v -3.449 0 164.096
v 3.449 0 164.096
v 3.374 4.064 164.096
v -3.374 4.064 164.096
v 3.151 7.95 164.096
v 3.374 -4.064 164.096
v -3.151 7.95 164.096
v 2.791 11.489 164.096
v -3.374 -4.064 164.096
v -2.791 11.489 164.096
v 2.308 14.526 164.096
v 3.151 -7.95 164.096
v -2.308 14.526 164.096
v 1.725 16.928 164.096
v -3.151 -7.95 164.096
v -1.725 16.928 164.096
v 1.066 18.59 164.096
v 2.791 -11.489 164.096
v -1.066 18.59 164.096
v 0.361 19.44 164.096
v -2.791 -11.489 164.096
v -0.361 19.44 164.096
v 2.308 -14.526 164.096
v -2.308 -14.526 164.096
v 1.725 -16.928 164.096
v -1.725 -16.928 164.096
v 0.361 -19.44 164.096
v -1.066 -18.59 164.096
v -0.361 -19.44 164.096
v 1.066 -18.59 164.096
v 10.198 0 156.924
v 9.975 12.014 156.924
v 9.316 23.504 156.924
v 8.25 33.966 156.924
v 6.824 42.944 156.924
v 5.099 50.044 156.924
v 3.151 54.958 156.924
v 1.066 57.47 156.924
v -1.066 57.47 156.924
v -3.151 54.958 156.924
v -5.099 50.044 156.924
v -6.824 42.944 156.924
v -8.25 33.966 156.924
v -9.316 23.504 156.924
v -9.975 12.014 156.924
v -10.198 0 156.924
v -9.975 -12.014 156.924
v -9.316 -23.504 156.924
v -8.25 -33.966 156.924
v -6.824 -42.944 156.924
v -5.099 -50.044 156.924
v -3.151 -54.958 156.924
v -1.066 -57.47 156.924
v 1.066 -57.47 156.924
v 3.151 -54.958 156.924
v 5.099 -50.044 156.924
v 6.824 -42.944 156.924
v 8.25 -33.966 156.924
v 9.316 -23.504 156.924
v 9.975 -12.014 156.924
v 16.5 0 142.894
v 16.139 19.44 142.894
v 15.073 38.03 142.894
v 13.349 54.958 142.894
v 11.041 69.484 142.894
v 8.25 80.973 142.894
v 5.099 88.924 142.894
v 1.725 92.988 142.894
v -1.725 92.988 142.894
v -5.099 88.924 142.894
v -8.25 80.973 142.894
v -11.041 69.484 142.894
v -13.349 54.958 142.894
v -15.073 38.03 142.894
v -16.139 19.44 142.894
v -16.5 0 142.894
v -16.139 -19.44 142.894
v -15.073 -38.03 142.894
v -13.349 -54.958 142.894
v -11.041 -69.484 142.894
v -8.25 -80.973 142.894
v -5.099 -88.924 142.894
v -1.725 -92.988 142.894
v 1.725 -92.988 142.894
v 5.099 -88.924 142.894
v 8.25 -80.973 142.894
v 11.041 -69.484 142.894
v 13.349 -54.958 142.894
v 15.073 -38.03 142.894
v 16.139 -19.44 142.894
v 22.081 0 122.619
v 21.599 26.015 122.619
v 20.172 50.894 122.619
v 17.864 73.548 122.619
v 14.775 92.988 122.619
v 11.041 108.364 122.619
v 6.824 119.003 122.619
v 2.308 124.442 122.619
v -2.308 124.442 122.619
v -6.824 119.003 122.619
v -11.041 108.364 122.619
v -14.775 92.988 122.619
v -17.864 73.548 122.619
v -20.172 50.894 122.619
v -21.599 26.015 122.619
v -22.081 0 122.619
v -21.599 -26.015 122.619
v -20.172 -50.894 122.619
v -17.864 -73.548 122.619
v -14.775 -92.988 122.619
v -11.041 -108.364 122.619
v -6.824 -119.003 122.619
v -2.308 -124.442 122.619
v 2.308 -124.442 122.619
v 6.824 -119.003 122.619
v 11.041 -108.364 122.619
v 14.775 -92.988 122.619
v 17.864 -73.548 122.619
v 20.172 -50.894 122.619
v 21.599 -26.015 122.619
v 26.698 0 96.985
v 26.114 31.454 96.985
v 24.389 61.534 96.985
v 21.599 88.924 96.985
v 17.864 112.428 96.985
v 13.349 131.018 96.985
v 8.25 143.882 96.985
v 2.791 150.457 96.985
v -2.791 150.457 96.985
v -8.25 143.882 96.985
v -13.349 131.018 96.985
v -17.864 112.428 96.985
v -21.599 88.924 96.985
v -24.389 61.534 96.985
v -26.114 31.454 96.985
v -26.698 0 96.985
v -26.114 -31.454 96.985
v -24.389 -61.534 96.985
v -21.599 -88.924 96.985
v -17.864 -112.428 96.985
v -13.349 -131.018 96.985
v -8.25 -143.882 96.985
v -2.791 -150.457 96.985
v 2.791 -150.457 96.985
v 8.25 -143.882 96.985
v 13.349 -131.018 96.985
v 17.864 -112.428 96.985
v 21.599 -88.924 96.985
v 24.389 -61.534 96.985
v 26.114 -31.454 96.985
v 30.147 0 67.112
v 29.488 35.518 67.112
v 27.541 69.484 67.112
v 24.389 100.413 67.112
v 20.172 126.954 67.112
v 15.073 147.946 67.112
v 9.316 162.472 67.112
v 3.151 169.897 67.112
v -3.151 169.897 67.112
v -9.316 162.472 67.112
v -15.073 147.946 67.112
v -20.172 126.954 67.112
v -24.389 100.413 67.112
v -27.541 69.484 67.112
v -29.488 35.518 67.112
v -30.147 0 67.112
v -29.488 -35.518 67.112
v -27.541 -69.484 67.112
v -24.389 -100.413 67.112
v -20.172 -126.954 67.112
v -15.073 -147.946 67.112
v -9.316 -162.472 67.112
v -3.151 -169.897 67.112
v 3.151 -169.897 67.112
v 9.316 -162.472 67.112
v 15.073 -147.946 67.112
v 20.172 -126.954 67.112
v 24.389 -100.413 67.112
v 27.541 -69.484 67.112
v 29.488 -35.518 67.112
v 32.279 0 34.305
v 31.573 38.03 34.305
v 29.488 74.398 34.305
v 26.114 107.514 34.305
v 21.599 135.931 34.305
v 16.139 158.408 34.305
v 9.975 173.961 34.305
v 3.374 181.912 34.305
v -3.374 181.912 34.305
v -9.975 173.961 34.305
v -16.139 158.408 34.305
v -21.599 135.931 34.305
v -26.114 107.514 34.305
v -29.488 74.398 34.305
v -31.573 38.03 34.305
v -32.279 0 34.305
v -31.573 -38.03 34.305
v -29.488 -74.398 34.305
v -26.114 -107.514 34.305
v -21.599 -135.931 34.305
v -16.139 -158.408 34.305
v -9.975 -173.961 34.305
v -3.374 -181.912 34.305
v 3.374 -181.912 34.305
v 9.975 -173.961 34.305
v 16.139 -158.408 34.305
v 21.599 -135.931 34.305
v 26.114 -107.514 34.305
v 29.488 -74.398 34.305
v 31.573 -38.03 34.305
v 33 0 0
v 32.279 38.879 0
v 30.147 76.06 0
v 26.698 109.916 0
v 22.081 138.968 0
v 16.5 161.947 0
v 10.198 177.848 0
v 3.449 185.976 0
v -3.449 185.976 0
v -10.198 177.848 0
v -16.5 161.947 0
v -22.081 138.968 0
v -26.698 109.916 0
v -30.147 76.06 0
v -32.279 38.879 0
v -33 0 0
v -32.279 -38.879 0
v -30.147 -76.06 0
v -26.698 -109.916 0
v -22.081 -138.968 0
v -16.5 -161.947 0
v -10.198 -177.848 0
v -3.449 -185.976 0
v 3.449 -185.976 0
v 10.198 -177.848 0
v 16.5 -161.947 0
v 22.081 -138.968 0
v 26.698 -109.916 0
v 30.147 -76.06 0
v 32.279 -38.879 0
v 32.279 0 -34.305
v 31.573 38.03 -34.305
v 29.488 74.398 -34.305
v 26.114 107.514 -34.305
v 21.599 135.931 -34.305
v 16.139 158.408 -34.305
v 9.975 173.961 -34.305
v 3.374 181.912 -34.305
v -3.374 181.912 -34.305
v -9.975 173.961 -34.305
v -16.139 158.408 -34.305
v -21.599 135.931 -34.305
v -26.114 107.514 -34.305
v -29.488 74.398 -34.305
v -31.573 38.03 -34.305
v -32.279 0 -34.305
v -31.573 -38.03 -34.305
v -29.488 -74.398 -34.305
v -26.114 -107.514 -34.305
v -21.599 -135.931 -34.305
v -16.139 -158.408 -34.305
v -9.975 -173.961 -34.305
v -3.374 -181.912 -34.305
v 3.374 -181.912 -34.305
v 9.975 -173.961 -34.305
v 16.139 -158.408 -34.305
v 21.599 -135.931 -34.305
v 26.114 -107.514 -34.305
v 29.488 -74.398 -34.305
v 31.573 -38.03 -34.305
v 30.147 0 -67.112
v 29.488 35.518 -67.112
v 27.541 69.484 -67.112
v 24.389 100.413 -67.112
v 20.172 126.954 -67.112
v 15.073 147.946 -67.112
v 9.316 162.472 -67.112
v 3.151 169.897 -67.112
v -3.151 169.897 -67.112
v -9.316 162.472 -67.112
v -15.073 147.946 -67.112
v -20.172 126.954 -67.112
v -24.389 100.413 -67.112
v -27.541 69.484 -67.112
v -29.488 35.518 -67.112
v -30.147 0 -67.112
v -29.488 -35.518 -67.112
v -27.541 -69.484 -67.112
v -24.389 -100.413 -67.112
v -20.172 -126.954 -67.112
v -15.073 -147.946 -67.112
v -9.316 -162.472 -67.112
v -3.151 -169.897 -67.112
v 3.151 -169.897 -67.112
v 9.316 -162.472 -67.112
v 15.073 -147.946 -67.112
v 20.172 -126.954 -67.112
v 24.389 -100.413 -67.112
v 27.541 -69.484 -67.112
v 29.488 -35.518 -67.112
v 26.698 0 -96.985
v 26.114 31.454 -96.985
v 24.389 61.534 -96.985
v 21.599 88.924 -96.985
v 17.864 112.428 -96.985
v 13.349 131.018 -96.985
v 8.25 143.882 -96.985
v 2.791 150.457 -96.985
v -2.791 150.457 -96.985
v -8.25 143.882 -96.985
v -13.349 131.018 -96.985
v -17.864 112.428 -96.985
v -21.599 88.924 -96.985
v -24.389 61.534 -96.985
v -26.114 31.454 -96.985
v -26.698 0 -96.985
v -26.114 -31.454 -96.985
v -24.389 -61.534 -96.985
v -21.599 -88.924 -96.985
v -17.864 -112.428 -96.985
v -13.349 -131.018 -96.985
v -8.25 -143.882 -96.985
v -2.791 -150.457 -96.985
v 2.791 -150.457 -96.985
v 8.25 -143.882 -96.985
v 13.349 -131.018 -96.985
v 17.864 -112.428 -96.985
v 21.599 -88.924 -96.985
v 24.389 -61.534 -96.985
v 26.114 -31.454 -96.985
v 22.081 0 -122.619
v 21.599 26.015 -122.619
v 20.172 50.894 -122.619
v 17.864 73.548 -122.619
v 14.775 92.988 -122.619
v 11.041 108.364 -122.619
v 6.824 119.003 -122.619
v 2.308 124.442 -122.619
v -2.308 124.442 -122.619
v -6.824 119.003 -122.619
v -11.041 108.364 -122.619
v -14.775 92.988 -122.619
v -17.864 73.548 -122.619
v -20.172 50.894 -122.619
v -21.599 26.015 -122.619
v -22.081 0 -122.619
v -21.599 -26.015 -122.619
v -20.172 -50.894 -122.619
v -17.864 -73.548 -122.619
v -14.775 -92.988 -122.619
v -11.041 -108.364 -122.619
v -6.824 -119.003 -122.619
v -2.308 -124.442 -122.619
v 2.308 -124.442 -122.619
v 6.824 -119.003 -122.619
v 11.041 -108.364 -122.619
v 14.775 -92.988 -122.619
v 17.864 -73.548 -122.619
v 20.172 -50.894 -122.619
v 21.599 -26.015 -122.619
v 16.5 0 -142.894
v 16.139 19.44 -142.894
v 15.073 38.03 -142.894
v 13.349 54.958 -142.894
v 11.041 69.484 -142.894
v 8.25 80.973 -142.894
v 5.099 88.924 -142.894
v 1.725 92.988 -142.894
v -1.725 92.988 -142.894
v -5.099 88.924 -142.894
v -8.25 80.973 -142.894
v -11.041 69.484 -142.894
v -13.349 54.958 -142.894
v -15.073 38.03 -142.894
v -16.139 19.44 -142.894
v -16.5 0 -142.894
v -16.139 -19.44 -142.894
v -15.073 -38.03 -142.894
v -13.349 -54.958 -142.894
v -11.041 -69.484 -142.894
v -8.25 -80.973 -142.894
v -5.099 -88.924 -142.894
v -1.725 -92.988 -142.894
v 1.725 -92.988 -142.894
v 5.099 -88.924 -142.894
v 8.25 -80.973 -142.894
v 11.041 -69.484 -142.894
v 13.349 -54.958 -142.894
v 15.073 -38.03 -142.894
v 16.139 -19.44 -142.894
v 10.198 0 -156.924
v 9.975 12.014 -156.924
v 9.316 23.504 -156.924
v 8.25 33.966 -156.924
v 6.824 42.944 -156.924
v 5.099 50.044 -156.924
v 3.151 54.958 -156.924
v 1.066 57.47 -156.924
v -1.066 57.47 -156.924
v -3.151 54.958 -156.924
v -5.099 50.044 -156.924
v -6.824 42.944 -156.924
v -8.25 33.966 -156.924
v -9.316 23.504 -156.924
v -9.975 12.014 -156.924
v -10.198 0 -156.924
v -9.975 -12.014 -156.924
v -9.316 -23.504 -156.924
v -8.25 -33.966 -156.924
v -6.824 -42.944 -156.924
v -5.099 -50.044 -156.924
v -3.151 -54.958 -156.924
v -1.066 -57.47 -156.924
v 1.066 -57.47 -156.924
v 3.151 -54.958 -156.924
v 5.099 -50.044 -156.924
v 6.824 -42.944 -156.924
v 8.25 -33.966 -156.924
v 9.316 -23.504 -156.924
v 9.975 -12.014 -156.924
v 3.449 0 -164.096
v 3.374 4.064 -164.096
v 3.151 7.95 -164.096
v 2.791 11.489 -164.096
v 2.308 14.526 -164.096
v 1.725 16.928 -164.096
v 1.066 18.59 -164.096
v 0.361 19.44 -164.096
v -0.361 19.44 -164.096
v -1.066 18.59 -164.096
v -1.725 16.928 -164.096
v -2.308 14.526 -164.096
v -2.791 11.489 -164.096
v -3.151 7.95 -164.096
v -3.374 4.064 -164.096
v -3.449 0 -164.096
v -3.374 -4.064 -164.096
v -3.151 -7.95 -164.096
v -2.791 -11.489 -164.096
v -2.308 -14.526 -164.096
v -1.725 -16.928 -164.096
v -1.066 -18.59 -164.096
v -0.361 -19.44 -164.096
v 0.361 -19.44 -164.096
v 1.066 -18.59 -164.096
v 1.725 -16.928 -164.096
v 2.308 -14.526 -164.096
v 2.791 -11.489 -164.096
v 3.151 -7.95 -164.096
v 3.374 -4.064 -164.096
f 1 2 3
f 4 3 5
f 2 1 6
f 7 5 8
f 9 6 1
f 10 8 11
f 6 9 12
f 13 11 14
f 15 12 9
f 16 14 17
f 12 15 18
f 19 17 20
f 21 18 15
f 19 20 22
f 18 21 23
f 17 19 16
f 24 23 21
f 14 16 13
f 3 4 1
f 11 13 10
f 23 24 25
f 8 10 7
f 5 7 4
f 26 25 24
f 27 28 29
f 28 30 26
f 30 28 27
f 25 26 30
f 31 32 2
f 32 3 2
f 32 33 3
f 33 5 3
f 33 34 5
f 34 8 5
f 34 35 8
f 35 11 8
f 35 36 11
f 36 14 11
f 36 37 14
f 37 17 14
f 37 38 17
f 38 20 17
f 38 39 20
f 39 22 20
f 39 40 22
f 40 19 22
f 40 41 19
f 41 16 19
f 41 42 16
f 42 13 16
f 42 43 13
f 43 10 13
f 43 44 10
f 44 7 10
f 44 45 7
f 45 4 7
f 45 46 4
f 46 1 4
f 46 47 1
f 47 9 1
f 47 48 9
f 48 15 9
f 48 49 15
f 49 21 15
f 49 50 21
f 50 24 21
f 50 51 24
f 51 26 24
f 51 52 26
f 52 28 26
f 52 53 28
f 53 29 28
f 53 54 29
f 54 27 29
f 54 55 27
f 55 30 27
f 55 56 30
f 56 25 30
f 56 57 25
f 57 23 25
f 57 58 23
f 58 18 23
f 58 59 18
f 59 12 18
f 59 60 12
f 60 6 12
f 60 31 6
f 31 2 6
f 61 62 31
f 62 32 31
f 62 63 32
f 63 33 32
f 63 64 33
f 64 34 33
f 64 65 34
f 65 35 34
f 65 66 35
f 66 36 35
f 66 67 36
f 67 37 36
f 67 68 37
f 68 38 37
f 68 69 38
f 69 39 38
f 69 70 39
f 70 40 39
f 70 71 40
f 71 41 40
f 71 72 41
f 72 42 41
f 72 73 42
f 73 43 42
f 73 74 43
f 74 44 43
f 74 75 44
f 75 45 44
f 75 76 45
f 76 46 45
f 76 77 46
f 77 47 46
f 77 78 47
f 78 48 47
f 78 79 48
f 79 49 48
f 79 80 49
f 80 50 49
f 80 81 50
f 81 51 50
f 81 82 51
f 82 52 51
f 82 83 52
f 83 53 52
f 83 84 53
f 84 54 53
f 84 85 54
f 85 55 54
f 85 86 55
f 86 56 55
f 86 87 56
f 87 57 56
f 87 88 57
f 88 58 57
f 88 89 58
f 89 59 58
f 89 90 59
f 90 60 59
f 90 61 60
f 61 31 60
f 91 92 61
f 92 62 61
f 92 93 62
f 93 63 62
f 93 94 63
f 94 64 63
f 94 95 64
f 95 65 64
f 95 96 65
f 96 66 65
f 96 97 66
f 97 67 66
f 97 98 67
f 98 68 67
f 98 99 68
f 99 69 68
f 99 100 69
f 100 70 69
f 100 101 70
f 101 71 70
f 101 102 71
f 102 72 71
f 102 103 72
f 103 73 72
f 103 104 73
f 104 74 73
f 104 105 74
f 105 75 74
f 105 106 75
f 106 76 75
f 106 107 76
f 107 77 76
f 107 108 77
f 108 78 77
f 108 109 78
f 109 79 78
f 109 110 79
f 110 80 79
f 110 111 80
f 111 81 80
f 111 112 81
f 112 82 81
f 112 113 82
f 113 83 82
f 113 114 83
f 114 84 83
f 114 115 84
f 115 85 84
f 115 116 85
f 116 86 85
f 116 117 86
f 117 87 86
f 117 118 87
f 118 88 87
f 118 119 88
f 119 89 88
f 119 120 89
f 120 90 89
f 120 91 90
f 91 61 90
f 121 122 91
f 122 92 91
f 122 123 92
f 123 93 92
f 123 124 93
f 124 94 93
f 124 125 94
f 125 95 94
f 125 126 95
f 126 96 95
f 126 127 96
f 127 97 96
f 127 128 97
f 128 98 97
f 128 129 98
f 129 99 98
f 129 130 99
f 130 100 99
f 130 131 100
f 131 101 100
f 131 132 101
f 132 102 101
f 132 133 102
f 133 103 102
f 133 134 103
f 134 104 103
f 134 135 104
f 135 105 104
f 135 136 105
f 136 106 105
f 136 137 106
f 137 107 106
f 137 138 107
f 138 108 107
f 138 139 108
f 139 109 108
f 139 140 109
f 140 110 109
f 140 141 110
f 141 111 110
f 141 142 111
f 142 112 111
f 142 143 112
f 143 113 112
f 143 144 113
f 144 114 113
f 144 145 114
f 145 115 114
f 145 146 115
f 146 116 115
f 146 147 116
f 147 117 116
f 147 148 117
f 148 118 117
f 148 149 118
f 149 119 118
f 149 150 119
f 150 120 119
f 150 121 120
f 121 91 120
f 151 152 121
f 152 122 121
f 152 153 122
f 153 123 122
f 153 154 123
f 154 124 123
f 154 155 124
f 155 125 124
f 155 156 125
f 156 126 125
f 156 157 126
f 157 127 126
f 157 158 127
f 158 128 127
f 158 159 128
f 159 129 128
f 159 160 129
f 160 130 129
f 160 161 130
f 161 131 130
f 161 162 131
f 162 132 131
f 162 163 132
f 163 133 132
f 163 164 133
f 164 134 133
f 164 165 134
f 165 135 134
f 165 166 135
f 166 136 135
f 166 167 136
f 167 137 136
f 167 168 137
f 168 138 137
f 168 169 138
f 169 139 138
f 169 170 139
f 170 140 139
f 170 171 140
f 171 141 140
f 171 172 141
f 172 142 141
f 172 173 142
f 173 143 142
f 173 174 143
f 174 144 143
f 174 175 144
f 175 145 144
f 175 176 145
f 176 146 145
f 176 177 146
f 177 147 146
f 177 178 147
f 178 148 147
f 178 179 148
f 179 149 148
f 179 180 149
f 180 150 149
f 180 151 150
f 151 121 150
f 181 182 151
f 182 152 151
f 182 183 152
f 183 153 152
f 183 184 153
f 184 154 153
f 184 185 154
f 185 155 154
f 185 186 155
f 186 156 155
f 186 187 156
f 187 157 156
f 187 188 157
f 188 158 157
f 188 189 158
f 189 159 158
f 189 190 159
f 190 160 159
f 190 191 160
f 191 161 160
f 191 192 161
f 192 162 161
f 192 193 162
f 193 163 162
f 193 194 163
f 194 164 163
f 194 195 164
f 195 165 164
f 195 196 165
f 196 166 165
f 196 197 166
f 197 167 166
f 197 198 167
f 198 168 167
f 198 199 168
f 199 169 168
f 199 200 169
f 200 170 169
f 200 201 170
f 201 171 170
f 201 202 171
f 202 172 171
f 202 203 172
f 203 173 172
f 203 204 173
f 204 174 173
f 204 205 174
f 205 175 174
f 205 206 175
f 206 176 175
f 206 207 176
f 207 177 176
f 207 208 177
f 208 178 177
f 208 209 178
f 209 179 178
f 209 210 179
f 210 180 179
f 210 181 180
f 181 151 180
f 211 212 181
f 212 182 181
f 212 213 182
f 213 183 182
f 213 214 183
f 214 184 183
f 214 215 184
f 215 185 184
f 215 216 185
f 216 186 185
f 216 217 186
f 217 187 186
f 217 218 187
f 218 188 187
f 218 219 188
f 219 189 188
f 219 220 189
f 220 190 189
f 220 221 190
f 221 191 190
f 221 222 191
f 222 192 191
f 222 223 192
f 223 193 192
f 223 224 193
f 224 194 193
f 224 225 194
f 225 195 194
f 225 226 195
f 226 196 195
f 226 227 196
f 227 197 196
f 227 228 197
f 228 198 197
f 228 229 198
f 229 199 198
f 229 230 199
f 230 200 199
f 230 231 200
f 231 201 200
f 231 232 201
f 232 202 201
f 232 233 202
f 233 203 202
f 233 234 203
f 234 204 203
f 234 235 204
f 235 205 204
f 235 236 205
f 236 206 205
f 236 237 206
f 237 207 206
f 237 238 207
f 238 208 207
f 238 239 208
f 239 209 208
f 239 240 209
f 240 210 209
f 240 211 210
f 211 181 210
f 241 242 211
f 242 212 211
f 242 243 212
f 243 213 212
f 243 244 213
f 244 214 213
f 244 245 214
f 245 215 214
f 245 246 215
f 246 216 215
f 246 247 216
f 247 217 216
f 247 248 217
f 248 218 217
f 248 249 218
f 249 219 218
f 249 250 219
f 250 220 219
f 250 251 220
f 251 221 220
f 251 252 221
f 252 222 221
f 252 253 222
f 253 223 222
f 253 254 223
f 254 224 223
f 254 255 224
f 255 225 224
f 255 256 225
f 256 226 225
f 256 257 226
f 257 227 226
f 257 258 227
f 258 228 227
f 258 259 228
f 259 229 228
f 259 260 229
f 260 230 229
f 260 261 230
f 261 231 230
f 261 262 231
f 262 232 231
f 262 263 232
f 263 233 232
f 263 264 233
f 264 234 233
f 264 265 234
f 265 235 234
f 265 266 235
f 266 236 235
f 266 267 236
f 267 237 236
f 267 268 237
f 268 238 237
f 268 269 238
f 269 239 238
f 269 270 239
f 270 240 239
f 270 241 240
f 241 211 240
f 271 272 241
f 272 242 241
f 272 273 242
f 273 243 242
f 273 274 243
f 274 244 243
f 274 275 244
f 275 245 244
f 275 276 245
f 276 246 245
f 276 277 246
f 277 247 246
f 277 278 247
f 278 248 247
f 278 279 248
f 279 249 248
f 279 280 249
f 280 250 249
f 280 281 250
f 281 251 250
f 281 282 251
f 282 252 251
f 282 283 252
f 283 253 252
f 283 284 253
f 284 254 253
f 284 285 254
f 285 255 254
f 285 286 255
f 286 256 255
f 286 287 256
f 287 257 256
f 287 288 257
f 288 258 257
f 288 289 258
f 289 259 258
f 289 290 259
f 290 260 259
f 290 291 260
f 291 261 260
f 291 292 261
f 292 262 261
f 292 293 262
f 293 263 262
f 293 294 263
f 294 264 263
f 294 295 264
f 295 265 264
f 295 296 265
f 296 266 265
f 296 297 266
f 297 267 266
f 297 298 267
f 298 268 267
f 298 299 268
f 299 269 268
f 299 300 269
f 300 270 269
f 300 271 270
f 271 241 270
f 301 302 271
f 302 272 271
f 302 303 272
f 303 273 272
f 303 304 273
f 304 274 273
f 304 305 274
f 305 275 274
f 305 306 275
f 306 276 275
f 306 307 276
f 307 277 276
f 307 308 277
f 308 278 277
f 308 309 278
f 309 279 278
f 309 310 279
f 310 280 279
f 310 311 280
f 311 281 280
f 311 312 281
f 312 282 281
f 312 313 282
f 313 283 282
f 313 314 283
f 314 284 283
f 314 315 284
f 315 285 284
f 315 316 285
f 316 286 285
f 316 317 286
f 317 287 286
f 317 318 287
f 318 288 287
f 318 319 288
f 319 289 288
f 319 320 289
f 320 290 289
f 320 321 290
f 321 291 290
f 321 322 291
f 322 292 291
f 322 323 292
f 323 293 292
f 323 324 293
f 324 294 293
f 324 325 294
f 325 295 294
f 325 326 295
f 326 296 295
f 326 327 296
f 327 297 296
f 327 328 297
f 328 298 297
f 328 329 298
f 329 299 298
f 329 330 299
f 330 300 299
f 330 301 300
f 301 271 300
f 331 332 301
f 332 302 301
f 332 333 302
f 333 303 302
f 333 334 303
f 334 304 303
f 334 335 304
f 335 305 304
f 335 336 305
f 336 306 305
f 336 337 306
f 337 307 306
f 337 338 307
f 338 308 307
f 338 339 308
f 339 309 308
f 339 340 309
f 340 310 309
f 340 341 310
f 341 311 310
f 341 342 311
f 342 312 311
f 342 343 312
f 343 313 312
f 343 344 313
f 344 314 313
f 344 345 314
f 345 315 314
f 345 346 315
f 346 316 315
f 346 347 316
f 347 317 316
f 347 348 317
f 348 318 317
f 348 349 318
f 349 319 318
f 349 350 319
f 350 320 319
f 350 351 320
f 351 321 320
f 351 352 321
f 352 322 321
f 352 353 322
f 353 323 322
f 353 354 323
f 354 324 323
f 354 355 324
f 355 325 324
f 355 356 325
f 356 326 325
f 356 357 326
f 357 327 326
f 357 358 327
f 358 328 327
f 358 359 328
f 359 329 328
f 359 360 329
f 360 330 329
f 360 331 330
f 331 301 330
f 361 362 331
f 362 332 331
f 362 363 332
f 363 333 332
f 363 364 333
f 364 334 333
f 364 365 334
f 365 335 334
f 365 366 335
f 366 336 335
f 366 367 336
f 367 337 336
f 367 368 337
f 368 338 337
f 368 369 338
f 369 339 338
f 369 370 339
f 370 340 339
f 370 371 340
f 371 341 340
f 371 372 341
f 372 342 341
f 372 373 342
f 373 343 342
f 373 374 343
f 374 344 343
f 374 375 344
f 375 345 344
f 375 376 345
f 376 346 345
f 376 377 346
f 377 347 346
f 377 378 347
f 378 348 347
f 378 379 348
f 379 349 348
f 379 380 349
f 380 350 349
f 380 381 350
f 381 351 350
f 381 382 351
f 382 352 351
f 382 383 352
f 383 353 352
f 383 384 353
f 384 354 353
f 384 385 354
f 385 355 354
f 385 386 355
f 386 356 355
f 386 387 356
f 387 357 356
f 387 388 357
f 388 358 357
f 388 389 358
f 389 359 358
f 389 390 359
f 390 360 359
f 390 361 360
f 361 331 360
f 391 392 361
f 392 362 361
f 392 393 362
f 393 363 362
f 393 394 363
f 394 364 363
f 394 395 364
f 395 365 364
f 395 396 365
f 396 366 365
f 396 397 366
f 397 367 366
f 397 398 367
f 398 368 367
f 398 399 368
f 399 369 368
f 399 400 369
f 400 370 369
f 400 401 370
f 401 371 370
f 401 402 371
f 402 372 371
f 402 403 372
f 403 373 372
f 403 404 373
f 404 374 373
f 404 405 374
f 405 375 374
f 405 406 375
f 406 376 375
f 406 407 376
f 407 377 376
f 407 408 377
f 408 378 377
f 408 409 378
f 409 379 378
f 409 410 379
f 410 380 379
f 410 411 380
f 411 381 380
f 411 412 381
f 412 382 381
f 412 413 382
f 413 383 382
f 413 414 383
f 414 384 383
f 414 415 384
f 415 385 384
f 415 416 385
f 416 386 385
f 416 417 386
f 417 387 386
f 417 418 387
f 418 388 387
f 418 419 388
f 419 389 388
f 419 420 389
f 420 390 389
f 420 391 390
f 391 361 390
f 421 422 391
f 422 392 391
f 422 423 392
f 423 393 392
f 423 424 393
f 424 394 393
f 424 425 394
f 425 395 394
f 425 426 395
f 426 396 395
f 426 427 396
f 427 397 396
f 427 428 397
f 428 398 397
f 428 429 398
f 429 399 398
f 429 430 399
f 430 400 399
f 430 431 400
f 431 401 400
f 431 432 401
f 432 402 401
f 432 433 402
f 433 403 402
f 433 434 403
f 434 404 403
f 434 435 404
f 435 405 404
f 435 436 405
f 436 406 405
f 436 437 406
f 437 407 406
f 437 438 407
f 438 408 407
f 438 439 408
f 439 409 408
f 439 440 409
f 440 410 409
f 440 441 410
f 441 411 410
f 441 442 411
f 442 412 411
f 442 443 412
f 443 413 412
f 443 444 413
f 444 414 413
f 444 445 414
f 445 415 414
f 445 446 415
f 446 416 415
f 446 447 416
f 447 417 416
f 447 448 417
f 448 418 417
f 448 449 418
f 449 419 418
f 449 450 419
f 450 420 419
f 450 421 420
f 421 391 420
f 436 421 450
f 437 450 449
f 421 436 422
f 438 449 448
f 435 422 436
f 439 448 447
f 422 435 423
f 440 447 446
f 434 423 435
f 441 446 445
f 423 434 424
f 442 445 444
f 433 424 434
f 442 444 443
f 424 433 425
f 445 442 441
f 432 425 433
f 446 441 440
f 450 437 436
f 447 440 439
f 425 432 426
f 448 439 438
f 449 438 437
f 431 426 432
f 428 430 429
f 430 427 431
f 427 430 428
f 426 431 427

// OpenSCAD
// Generated by SolidPython 1.0.1 on 2020-07-29 00:46:46


scale(v = [3, 17, 15]) {
	sphere(r = 11);
}
/***********************************************
*********      SolidPython code:      **********
************************************************
 
# import packages: SolidPython
from solid import *
from solid.utils import *
from itertools import chain, combinations, permutations


class Resize:

    def __init__(self, scad_file):
        self.scad_file = scad_file
        #self.scad_file = import_scad(scad_file)
        # cone/cylinder param:
        self.r1 = 0
        self.r2 = 0
        self.h = 0
        # rectangular prism param:
        self.w = 0
        self.l = 0
        # ellipse param:
        self.r = 0

    # import OpenScad code (file name corresponds to shape)


    # classify shape + parameters
    def assign(self, param1, param2, param3):
        if self.scad_file == 'cone.scad':
            self.r1 = param1
            self.r2 = param2
            self.h = param3
        elif self.scad_file == 'cylinder.scad':
            self.r1 = param1
            self.r2 = param2
            self.h = param3
        elif self.scad_file == 'rectangularPrism.scad':
            self.h = param1
            self.l = param2
            self.w = param3
        else:
            self.r = param1
            self.h = param2

    # resize parameters
    def iterate(self):
        x = range(3, 20, 2)
        i = 1
        if self.scad_file == 'cone.scad':
            tempList = list(permutations(x, 2))
            for temp in tempList:
                param1 = temp[0]
                param2 = temp[1]
                filepath = 'produced_scad_files/' + 'cone' + str(param1) + '_' + str(param2) + '_' + '.scad'
                scad_render_to_file(cylinder(h=param1, r1=param2, r2=0), filepath)

        elif self.scad_file == 'cylinder.scad':
            tempList = list(permutations(x, 3))
            for temp in tempList:
                param1 = temp[0]
                param2 = temp[1]
                filepath = 'produced_scad_files/' + 'cylinder' + str(param1) + '_' + str(param2) + '_' + '.scad'
                scad_render_to_file(cylinder(h=param1, r1=param2, r2=param2), filepath)

        elif self.scad_file == 'rectangularPrism.scad':
            tempList = list(permutations(x, 3))
            for temp in tempList:
                param1 = temp[0]
                param2 = temp[1]
                param3 = temp[2]
                filepath = 'produced_scad_files/' + 'rectangularPrism' + str(param1) + '_' + str(param2) + '_' + str(
                    param3) + '.scad'
                scad_render_to_file(cube(size=(param1, param2, param3)), filepath)

        elif self.scad_file == 'ellipse.scad':
            tempList = list(permutations(x, 4))
            for temp in tempList:
                param1 = temp[0]
                param2 = temp[1]
                param3 = temp[2]
                param4 = temp[3]
                filepath = 'produced_scad_files/' + 'ellipse' + str(param1) + '_' + str(param2) + '_' + str(param3) + '_' + str(param4) + '.scad'
                scad_render_to_file(scale([param1, param2, param3])(sphere(r=param4)), filepath)

    def render_to_scadfile(self):
        scad_render_to_file(scad, 'example.scad') 
 
************************************************/
